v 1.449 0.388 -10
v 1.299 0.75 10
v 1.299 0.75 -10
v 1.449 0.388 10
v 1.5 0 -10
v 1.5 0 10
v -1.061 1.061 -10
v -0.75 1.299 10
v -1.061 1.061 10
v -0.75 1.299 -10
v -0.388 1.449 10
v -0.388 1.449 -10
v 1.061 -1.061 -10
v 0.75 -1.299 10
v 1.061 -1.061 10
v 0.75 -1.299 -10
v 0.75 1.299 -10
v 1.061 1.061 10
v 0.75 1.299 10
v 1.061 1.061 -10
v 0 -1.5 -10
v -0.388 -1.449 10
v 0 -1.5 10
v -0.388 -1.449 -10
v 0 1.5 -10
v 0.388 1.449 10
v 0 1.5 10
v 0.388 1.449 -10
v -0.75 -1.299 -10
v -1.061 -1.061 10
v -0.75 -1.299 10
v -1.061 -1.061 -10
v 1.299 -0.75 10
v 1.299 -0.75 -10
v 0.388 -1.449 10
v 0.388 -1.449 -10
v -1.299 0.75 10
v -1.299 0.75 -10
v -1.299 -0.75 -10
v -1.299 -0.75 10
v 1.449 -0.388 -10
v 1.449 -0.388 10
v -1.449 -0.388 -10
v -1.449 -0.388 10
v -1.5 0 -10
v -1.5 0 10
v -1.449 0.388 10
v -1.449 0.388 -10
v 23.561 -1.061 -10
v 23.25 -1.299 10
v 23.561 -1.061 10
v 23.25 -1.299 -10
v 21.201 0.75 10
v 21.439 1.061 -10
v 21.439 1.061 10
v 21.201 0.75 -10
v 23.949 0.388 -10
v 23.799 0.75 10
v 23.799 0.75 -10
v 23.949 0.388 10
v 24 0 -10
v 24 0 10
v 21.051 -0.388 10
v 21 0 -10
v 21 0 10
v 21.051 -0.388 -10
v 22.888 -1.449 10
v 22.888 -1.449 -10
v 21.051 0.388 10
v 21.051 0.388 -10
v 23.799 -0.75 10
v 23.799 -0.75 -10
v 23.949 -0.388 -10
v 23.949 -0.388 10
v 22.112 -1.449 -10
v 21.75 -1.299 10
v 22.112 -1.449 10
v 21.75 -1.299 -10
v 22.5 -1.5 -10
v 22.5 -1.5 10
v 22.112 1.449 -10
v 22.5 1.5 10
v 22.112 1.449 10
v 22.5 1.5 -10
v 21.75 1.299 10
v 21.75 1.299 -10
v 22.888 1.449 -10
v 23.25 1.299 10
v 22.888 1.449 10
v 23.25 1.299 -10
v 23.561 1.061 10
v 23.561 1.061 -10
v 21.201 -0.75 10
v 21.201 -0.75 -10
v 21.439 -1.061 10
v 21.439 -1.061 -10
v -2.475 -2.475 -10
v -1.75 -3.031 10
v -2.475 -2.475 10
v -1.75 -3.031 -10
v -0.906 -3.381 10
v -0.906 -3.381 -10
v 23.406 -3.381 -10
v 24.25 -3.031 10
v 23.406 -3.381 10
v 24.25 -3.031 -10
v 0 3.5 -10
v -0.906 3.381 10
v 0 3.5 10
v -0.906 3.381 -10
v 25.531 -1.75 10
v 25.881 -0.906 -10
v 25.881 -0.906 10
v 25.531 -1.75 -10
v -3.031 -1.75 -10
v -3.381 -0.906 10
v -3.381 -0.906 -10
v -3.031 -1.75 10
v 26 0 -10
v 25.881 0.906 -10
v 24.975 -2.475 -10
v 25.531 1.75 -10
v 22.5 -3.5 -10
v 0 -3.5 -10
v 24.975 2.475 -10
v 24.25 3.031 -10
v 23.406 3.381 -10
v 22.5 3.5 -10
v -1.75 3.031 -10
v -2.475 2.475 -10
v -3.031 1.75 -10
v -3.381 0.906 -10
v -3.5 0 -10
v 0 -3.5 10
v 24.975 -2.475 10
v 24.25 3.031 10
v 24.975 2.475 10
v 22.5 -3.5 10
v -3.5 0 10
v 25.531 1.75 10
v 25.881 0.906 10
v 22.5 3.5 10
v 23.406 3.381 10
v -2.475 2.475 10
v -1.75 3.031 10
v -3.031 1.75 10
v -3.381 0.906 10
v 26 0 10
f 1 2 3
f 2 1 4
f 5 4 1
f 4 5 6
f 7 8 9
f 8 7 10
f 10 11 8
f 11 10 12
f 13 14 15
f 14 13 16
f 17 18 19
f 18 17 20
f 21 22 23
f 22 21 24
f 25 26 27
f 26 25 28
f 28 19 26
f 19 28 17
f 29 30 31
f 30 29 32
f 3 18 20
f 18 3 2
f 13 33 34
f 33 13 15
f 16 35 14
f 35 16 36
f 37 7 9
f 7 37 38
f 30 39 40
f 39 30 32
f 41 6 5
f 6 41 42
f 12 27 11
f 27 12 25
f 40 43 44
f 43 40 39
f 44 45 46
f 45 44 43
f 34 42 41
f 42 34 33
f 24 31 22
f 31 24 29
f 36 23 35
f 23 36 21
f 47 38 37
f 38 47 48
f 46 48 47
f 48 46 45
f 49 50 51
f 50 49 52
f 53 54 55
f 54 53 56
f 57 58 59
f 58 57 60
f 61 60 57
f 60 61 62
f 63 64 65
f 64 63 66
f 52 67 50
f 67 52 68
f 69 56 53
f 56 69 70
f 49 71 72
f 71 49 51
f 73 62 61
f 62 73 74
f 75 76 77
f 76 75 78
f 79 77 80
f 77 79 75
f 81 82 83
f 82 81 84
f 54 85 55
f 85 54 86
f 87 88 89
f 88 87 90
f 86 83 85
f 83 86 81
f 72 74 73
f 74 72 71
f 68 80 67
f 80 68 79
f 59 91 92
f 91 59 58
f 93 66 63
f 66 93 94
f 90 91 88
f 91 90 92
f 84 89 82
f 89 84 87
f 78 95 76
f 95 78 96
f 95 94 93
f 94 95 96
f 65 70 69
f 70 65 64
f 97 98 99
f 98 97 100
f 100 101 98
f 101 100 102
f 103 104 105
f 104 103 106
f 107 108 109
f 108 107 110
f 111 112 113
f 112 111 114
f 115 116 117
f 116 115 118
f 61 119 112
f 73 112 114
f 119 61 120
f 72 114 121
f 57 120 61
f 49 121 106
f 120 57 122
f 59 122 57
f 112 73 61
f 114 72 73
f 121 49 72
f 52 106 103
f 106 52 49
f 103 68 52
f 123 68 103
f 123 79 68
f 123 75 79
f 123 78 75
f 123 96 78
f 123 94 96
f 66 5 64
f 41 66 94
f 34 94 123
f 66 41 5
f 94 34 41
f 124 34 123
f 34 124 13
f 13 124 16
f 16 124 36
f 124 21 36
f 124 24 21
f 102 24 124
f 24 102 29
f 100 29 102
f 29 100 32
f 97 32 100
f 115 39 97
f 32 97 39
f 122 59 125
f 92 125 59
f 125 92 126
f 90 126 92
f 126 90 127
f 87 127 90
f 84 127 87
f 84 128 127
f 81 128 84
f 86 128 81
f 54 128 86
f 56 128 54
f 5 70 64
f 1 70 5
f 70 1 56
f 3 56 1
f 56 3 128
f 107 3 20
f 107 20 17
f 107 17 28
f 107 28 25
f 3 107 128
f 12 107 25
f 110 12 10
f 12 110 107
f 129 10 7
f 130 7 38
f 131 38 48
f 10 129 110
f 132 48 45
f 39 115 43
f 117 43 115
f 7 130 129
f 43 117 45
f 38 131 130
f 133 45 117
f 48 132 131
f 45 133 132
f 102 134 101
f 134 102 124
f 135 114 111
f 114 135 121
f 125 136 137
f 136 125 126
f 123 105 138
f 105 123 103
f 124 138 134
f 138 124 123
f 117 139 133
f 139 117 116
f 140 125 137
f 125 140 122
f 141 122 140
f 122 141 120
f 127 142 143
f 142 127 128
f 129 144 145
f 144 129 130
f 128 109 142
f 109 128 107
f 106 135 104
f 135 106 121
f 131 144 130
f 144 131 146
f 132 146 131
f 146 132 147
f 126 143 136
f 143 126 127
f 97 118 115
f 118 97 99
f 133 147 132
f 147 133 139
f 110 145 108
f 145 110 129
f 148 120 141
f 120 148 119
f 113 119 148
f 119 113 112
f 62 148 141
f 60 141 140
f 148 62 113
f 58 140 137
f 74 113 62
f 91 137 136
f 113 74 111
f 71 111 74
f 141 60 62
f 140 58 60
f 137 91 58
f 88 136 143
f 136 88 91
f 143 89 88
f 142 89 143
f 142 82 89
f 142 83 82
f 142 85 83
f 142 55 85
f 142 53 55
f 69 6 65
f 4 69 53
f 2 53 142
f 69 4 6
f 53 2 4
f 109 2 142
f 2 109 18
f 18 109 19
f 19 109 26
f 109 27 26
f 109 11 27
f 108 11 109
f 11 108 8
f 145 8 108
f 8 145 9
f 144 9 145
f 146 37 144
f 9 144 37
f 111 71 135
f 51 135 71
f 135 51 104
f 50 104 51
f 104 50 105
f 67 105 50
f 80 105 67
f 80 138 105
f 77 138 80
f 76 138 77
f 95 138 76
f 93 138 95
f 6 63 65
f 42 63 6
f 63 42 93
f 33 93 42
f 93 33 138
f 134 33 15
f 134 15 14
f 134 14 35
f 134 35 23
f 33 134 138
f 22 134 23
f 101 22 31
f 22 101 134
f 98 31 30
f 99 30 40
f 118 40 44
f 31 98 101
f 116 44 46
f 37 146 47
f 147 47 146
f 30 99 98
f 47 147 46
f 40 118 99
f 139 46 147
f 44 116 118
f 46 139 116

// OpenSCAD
// file: config.scad
e = 0.01;

// Real Sterilite Tote Size
//toteHeight = 125;
//toteTopWidth = 200;
//toteBottomWidth = 155;
//toteTopLength = 355;
//toteBottomLength = 300;

// Scaled Size
toteHeight = 30;
toteTopWidth = 60;
toteBottomWidth = 45;
toteTopLength = 105;
toteBottomLength = 90;

// Parameters
fingerHeight = 5;
fingerClearance = 5;

armatureHeight = 10;
armatureThickness = 20;

baseHeight = 20;
baseThickness = 10;

boltDiameter = 3;
pinDiameter = 4;

base2Height = 20;

totesPerRow = 3;
// main file
include <config.scad>;

module armPaddle(armLength) {
  difference() {
    hull()
      for (x = [0, 1])
        translate([x*armLength, 0, 0])
          cylinder(d = 7, h = armatureThickness, center = true, $fn = 24);

    for (x = [0, 1])
      translate([x*armLength, 0, 0])
        cylinder(d = 3, h = armatureThickness + e, center = true, $fn = 24);
  }
}

!armPaddle(22.5);
